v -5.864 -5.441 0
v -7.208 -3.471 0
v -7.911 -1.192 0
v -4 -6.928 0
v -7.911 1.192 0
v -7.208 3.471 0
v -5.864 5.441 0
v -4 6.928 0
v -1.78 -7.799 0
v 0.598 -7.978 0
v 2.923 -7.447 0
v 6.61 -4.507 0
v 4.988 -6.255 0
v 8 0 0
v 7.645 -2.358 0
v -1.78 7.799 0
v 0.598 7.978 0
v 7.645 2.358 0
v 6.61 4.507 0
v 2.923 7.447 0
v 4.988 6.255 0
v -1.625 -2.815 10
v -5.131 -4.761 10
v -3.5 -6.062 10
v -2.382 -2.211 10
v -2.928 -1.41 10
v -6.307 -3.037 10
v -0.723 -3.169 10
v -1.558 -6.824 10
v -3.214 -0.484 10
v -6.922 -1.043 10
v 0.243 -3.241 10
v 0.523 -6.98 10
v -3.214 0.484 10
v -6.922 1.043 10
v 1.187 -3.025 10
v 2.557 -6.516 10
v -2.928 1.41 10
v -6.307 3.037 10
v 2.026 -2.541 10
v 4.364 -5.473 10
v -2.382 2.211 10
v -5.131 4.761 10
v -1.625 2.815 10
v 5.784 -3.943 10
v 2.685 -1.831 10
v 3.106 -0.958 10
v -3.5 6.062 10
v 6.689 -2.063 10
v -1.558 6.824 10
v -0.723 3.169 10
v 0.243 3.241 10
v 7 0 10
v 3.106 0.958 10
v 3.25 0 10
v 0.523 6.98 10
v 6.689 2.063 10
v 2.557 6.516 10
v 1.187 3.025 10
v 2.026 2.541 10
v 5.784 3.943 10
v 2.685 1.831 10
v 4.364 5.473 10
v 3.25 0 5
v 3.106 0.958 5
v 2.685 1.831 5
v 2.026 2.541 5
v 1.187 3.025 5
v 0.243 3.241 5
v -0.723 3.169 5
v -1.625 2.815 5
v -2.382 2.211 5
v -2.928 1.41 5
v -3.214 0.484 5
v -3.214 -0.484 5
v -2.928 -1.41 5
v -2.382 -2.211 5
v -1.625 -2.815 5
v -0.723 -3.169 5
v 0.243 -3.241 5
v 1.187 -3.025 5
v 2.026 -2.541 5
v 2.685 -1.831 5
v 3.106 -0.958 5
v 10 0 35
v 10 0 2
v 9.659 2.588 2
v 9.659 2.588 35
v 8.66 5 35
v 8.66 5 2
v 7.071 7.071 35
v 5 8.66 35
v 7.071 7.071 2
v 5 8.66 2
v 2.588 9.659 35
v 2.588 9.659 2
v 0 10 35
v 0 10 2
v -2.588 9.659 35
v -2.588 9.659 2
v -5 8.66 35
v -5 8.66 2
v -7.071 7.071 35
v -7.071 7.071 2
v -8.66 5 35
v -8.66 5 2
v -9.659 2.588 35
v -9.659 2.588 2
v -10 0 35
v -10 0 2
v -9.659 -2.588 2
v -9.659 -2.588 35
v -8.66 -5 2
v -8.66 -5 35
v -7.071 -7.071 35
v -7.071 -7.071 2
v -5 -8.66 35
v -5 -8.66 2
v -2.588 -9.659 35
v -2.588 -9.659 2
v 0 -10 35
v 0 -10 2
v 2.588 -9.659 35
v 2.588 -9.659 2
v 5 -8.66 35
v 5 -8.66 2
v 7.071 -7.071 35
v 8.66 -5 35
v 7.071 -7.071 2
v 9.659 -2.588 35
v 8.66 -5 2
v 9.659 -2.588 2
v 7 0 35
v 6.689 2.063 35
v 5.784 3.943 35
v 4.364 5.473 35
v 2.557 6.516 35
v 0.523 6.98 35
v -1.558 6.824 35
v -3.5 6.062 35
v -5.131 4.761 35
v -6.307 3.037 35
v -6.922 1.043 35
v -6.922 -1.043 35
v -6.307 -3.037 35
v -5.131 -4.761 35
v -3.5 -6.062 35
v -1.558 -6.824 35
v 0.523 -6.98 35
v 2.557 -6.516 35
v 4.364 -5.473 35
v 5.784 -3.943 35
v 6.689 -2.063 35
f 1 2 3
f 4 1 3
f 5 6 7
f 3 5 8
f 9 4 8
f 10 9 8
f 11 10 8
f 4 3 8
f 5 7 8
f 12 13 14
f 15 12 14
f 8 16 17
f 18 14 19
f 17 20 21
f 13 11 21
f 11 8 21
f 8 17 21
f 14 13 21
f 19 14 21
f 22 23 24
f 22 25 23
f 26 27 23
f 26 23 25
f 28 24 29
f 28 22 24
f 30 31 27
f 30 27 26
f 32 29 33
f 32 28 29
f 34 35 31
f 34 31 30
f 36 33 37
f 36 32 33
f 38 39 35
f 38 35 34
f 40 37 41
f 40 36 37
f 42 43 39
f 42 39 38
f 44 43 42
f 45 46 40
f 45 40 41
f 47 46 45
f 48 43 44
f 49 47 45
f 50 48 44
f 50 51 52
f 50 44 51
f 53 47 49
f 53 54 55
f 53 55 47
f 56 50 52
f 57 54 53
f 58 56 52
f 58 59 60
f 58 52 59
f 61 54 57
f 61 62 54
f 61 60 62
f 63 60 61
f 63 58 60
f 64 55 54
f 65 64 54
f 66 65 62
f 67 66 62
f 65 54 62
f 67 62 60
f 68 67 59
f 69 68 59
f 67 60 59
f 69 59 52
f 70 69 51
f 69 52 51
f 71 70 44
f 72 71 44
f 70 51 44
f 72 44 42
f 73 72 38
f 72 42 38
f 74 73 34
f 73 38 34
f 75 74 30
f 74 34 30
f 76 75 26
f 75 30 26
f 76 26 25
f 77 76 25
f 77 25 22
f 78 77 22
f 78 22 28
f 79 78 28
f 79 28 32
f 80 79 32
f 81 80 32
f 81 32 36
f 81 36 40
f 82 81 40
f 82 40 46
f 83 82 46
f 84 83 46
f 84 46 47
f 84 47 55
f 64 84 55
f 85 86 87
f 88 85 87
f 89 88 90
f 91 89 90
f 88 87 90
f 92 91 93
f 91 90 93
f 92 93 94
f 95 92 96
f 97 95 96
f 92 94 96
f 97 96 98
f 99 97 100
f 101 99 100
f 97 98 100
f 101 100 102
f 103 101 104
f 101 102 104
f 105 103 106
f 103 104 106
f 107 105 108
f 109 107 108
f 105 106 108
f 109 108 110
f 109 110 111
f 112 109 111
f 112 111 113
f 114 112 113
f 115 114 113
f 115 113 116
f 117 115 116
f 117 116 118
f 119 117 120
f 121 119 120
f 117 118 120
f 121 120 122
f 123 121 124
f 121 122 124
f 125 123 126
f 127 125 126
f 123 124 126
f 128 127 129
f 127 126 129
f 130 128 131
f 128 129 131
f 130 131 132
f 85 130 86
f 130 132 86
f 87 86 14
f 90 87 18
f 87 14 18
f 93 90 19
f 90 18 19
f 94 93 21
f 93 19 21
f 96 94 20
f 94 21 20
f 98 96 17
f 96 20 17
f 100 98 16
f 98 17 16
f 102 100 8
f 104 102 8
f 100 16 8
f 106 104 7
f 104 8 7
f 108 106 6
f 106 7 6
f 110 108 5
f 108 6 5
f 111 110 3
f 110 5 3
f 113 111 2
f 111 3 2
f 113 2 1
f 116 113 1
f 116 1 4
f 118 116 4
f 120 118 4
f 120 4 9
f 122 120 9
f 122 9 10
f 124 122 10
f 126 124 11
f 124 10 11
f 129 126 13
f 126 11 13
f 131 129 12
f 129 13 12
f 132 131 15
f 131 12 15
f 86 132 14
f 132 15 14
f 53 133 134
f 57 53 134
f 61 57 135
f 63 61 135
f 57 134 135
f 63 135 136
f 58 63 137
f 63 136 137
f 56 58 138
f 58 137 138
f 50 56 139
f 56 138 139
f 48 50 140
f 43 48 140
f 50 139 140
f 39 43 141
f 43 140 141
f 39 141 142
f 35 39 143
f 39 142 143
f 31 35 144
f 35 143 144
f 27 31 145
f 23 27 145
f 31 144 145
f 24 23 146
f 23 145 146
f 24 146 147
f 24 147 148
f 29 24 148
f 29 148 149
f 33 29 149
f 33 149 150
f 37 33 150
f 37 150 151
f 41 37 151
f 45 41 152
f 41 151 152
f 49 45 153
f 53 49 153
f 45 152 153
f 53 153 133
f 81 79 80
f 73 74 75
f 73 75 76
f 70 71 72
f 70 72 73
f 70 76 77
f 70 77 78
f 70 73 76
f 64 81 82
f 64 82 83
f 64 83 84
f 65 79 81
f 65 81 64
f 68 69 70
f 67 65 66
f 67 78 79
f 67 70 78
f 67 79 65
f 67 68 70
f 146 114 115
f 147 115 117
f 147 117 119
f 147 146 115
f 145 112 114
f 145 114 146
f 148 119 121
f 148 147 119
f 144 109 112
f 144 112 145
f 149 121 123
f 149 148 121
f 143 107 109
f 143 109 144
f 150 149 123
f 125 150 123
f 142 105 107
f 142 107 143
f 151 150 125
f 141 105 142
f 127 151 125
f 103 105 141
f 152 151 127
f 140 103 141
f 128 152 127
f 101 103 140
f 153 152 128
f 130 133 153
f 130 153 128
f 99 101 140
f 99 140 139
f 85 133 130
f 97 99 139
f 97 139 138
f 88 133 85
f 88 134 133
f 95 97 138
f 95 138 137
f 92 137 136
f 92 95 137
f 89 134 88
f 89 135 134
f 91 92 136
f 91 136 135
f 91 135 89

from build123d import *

# Parameters (mm, degrees)
F0_R     = 10
F1_DEPTH = 35
F2_R     = 7
F4_DEPTH = 25
F3_R     = 3.25
F5_DEPTH = 30
F6_SIZE  = 2


with BuildPart() as f1:
    # F0 (on Top) → F1 (new body)
    with BuildSketch(Plane.XY):
        Circle(F0_R)
    extrude(amount=F1_DEPTH)

    # F2 (on face) → F4 (cut)
    with BuildSketch(Plane.XY.offset(35)):
        Circle(F2_R)
    extrude(amount=-F4_DEPTH, mode=Mode.SUBTRACT)

    # F3 (on face) → F5 (cut)
    with BuildSketch(Plane.XY.offset(35)):
        Circle(F3_R)
    extrude(amount=-F5_DEPTH, mode=Mode.SUBTRACT)

    # F6
    f6_edges = [f1.edges().sort_by_distance(p)[0] for p in [
        (-10, 0, 0),
    ]]
    chamfer(f6_edges, length=F6_SIZE)


solid = f1.part
